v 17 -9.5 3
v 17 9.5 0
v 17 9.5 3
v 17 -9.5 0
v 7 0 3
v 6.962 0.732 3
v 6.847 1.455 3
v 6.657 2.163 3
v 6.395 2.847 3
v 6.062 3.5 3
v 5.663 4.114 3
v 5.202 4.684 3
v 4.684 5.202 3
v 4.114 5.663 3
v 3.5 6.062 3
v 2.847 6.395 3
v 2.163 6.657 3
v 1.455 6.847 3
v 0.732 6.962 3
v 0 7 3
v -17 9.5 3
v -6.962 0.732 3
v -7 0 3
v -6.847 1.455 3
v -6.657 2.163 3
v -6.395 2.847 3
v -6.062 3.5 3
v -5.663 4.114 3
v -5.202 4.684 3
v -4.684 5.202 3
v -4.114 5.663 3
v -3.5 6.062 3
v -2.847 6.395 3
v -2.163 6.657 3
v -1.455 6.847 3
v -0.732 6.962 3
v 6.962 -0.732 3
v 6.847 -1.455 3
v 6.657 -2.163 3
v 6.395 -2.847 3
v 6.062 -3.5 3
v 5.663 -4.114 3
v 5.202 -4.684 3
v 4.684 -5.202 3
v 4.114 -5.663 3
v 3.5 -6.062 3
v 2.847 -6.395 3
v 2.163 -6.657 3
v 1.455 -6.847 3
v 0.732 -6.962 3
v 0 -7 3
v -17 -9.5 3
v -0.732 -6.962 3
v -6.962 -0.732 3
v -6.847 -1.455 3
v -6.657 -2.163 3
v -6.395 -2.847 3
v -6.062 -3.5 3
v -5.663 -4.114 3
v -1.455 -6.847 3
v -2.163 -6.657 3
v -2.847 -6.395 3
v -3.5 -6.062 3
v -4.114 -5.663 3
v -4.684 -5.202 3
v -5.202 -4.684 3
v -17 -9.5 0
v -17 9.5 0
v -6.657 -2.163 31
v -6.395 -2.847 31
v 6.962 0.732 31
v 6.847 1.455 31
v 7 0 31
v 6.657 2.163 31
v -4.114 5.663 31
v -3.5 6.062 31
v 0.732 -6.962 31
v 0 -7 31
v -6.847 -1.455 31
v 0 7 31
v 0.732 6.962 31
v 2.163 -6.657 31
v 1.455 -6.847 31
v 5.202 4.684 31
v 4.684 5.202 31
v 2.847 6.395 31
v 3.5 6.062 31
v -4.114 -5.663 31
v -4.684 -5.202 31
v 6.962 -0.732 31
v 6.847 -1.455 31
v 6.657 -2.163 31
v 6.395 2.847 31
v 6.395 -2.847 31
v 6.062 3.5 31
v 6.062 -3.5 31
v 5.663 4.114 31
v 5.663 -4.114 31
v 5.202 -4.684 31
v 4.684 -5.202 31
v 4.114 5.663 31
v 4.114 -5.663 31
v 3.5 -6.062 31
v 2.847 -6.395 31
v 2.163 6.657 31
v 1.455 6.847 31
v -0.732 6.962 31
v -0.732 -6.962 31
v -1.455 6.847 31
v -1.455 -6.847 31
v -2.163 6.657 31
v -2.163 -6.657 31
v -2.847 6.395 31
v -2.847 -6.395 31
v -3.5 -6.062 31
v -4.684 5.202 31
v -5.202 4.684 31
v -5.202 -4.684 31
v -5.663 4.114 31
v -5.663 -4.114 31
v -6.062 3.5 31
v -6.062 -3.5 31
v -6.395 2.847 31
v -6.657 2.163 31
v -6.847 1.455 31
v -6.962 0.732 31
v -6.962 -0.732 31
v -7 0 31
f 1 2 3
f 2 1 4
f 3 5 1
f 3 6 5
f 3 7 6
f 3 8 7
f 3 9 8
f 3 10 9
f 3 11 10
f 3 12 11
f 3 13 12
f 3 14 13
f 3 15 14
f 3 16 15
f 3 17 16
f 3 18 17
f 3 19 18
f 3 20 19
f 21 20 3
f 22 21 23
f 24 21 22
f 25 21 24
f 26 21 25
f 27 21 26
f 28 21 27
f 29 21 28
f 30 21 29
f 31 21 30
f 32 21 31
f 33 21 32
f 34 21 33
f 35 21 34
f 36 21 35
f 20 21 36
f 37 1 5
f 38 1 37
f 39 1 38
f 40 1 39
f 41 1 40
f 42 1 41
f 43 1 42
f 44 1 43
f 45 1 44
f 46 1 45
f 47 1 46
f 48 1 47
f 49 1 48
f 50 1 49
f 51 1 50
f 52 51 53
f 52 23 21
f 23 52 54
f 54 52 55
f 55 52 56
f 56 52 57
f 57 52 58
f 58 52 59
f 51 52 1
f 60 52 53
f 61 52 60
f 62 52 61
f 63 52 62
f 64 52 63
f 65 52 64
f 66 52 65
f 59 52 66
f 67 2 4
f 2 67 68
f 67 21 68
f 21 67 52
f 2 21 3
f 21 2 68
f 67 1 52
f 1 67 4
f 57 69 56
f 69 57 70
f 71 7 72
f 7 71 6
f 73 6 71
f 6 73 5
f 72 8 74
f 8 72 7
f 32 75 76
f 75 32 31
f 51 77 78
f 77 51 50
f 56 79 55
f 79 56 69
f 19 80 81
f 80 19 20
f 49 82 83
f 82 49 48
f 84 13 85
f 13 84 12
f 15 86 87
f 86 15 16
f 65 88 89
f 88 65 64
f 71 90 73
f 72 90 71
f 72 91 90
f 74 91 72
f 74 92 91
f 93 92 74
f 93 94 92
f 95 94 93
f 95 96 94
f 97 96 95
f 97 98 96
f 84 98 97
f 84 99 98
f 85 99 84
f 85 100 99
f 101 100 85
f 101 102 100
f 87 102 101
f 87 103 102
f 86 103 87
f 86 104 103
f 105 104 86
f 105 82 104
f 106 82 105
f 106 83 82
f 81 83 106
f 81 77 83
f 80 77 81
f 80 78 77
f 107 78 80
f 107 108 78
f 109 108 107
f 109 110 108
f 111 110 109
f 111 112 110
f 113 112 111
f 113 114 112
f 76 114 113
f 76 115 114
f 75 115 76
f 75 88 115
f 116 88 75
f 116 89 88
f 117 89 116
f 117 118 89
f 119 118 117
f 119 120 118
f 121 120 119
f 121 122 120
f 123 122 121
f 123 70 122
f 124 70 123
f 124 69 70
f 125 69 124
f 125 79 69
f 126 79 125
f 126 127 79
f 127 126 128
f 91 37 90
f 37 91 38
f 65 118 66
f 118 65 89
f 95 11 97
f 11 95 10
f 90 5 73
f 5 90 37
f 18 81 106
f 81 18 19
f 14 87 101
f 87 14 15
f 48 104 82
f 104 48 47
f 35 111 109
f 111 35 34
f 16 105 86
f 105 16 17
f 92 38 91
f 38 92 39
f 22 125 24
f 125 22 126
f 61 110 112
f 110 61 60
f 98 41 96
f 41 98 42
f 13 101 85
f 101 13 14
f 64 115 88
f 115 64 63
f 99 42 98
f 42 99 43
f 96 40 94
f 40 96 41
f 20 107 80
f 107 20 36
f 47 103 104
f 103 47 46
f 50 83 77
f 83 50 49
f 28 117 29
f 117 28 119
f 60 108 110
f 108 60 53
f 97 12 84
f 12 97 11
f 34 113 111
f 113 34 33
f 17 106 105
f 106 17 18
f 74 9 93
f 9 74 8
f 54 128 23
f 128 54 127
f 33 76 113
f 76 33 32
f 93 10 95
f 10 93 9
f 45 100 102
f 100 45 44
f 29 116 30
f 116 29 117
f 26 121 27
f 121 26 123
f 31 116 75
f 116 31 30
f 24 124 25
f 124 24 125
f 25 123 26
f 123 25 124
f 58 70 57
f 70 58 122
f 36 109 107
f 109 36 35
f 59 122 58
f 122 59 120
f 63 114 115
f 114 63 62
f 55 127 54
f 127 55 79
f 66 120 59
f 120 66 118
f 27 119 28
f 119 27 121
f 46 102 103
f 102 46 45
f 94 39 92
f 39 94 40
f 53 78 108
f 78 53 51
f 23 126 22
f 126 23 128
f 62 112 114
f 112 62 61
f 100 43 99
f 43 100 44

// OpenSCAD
// T-head slot bolt.
$fn = 60;
eps = 0.02;
shaft_d = 14;
head_l = 34;
shaft_l = 28;
head_w = shaft_d + 5;
head_h = 3;
union() {
    translate([-head_l/2,-head_w/2,0]) cube([head_l,head_w,head_h]);
    translate([0,0,head_h]) cylinder(d=shaft_d,h=shaft_l);
}
